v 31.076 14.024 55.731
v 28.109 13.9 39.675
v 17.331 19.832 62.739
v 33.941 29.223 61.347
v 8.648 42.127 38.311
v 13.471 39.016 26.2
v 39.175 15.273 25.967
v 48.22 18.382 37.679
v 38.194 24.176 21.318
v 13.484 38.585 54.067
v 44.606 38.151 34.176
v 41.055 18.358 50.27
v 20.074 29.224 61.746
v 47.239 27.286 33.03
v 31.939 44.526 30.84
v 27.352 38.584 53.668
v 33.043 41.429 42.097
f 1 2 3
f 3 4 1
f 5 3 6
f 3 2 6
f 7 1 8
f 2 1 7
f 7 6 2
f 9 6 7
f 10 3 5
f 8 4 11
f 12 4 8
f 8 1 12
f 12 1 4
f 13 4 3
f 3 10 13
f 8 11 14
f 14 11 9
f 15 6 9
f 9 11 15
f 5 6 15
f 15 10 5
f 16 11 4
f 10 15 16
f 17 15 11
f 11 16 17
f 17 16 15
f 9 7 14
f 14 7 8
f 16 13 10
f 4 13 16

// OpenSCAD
// Auto-generated auxetic polyhedron
points = [
    [17.330870, 19.831671, 62.738529],
    [28.109148, 13.900190, 39.674980],
    [31.075553, 14.023829, 55.730979],
    [33.941310, 29.222601, 61.346675],
    [13.471096, 39.016355, 26.199928],
    [8.647947, 42.127375, 38.311441],
    [48.219569, 18.382132, 37.678691],
    [39.174942, 15.272691, 25.966678],
    [38.194204, 24.176076, 21.318477],
    [13.484493, 38.585151, 54.067013],
    [44.606260, 38.150867, 34.175610],
    [41.054783, 18.357917, 50.270403],
    [20.073535, 29.224179, 61.746175],
    [47.238831, 27.285517, 33.030490],
    [31.938997, 44.526037, 30.840435],
    [27.352267, 38.583572, 53.667513],
    [33.042826, 41.428916, 42.096686],
];

faces = [
    [0, 1, 2],
    [2, 3, 0],
    [4, 0, 5],
    [4, 1, 0],
    [6, 2, 7],
    [7, 2, 1],
    [1, 4, 7],
    [7, 4, 8],
    [5, 0, 9],
    [10, 3, 6],
    [6, 3, 11],
    [11, 2, 6],
    [3, 2, 11],
    [0, 3, 12],
    [12, 9, 0],
    [13, 10, 6],
    [8, 10, 13],
    [8, 4, 14],
    [14, 10, 8],
    [14, 4, 5],
    [5, 9, 14],
    [3, 10, 15],
    [15, 14, 9],
    [10, 14, 16],
    [16, 15, 10],
    [14, 15, 16],
    [13, 7, 8],
    [6, 7, 13],
    [9, 12, 15],
    [15, 12, 3],
];

polyhedron(points = points, faces = faces);
